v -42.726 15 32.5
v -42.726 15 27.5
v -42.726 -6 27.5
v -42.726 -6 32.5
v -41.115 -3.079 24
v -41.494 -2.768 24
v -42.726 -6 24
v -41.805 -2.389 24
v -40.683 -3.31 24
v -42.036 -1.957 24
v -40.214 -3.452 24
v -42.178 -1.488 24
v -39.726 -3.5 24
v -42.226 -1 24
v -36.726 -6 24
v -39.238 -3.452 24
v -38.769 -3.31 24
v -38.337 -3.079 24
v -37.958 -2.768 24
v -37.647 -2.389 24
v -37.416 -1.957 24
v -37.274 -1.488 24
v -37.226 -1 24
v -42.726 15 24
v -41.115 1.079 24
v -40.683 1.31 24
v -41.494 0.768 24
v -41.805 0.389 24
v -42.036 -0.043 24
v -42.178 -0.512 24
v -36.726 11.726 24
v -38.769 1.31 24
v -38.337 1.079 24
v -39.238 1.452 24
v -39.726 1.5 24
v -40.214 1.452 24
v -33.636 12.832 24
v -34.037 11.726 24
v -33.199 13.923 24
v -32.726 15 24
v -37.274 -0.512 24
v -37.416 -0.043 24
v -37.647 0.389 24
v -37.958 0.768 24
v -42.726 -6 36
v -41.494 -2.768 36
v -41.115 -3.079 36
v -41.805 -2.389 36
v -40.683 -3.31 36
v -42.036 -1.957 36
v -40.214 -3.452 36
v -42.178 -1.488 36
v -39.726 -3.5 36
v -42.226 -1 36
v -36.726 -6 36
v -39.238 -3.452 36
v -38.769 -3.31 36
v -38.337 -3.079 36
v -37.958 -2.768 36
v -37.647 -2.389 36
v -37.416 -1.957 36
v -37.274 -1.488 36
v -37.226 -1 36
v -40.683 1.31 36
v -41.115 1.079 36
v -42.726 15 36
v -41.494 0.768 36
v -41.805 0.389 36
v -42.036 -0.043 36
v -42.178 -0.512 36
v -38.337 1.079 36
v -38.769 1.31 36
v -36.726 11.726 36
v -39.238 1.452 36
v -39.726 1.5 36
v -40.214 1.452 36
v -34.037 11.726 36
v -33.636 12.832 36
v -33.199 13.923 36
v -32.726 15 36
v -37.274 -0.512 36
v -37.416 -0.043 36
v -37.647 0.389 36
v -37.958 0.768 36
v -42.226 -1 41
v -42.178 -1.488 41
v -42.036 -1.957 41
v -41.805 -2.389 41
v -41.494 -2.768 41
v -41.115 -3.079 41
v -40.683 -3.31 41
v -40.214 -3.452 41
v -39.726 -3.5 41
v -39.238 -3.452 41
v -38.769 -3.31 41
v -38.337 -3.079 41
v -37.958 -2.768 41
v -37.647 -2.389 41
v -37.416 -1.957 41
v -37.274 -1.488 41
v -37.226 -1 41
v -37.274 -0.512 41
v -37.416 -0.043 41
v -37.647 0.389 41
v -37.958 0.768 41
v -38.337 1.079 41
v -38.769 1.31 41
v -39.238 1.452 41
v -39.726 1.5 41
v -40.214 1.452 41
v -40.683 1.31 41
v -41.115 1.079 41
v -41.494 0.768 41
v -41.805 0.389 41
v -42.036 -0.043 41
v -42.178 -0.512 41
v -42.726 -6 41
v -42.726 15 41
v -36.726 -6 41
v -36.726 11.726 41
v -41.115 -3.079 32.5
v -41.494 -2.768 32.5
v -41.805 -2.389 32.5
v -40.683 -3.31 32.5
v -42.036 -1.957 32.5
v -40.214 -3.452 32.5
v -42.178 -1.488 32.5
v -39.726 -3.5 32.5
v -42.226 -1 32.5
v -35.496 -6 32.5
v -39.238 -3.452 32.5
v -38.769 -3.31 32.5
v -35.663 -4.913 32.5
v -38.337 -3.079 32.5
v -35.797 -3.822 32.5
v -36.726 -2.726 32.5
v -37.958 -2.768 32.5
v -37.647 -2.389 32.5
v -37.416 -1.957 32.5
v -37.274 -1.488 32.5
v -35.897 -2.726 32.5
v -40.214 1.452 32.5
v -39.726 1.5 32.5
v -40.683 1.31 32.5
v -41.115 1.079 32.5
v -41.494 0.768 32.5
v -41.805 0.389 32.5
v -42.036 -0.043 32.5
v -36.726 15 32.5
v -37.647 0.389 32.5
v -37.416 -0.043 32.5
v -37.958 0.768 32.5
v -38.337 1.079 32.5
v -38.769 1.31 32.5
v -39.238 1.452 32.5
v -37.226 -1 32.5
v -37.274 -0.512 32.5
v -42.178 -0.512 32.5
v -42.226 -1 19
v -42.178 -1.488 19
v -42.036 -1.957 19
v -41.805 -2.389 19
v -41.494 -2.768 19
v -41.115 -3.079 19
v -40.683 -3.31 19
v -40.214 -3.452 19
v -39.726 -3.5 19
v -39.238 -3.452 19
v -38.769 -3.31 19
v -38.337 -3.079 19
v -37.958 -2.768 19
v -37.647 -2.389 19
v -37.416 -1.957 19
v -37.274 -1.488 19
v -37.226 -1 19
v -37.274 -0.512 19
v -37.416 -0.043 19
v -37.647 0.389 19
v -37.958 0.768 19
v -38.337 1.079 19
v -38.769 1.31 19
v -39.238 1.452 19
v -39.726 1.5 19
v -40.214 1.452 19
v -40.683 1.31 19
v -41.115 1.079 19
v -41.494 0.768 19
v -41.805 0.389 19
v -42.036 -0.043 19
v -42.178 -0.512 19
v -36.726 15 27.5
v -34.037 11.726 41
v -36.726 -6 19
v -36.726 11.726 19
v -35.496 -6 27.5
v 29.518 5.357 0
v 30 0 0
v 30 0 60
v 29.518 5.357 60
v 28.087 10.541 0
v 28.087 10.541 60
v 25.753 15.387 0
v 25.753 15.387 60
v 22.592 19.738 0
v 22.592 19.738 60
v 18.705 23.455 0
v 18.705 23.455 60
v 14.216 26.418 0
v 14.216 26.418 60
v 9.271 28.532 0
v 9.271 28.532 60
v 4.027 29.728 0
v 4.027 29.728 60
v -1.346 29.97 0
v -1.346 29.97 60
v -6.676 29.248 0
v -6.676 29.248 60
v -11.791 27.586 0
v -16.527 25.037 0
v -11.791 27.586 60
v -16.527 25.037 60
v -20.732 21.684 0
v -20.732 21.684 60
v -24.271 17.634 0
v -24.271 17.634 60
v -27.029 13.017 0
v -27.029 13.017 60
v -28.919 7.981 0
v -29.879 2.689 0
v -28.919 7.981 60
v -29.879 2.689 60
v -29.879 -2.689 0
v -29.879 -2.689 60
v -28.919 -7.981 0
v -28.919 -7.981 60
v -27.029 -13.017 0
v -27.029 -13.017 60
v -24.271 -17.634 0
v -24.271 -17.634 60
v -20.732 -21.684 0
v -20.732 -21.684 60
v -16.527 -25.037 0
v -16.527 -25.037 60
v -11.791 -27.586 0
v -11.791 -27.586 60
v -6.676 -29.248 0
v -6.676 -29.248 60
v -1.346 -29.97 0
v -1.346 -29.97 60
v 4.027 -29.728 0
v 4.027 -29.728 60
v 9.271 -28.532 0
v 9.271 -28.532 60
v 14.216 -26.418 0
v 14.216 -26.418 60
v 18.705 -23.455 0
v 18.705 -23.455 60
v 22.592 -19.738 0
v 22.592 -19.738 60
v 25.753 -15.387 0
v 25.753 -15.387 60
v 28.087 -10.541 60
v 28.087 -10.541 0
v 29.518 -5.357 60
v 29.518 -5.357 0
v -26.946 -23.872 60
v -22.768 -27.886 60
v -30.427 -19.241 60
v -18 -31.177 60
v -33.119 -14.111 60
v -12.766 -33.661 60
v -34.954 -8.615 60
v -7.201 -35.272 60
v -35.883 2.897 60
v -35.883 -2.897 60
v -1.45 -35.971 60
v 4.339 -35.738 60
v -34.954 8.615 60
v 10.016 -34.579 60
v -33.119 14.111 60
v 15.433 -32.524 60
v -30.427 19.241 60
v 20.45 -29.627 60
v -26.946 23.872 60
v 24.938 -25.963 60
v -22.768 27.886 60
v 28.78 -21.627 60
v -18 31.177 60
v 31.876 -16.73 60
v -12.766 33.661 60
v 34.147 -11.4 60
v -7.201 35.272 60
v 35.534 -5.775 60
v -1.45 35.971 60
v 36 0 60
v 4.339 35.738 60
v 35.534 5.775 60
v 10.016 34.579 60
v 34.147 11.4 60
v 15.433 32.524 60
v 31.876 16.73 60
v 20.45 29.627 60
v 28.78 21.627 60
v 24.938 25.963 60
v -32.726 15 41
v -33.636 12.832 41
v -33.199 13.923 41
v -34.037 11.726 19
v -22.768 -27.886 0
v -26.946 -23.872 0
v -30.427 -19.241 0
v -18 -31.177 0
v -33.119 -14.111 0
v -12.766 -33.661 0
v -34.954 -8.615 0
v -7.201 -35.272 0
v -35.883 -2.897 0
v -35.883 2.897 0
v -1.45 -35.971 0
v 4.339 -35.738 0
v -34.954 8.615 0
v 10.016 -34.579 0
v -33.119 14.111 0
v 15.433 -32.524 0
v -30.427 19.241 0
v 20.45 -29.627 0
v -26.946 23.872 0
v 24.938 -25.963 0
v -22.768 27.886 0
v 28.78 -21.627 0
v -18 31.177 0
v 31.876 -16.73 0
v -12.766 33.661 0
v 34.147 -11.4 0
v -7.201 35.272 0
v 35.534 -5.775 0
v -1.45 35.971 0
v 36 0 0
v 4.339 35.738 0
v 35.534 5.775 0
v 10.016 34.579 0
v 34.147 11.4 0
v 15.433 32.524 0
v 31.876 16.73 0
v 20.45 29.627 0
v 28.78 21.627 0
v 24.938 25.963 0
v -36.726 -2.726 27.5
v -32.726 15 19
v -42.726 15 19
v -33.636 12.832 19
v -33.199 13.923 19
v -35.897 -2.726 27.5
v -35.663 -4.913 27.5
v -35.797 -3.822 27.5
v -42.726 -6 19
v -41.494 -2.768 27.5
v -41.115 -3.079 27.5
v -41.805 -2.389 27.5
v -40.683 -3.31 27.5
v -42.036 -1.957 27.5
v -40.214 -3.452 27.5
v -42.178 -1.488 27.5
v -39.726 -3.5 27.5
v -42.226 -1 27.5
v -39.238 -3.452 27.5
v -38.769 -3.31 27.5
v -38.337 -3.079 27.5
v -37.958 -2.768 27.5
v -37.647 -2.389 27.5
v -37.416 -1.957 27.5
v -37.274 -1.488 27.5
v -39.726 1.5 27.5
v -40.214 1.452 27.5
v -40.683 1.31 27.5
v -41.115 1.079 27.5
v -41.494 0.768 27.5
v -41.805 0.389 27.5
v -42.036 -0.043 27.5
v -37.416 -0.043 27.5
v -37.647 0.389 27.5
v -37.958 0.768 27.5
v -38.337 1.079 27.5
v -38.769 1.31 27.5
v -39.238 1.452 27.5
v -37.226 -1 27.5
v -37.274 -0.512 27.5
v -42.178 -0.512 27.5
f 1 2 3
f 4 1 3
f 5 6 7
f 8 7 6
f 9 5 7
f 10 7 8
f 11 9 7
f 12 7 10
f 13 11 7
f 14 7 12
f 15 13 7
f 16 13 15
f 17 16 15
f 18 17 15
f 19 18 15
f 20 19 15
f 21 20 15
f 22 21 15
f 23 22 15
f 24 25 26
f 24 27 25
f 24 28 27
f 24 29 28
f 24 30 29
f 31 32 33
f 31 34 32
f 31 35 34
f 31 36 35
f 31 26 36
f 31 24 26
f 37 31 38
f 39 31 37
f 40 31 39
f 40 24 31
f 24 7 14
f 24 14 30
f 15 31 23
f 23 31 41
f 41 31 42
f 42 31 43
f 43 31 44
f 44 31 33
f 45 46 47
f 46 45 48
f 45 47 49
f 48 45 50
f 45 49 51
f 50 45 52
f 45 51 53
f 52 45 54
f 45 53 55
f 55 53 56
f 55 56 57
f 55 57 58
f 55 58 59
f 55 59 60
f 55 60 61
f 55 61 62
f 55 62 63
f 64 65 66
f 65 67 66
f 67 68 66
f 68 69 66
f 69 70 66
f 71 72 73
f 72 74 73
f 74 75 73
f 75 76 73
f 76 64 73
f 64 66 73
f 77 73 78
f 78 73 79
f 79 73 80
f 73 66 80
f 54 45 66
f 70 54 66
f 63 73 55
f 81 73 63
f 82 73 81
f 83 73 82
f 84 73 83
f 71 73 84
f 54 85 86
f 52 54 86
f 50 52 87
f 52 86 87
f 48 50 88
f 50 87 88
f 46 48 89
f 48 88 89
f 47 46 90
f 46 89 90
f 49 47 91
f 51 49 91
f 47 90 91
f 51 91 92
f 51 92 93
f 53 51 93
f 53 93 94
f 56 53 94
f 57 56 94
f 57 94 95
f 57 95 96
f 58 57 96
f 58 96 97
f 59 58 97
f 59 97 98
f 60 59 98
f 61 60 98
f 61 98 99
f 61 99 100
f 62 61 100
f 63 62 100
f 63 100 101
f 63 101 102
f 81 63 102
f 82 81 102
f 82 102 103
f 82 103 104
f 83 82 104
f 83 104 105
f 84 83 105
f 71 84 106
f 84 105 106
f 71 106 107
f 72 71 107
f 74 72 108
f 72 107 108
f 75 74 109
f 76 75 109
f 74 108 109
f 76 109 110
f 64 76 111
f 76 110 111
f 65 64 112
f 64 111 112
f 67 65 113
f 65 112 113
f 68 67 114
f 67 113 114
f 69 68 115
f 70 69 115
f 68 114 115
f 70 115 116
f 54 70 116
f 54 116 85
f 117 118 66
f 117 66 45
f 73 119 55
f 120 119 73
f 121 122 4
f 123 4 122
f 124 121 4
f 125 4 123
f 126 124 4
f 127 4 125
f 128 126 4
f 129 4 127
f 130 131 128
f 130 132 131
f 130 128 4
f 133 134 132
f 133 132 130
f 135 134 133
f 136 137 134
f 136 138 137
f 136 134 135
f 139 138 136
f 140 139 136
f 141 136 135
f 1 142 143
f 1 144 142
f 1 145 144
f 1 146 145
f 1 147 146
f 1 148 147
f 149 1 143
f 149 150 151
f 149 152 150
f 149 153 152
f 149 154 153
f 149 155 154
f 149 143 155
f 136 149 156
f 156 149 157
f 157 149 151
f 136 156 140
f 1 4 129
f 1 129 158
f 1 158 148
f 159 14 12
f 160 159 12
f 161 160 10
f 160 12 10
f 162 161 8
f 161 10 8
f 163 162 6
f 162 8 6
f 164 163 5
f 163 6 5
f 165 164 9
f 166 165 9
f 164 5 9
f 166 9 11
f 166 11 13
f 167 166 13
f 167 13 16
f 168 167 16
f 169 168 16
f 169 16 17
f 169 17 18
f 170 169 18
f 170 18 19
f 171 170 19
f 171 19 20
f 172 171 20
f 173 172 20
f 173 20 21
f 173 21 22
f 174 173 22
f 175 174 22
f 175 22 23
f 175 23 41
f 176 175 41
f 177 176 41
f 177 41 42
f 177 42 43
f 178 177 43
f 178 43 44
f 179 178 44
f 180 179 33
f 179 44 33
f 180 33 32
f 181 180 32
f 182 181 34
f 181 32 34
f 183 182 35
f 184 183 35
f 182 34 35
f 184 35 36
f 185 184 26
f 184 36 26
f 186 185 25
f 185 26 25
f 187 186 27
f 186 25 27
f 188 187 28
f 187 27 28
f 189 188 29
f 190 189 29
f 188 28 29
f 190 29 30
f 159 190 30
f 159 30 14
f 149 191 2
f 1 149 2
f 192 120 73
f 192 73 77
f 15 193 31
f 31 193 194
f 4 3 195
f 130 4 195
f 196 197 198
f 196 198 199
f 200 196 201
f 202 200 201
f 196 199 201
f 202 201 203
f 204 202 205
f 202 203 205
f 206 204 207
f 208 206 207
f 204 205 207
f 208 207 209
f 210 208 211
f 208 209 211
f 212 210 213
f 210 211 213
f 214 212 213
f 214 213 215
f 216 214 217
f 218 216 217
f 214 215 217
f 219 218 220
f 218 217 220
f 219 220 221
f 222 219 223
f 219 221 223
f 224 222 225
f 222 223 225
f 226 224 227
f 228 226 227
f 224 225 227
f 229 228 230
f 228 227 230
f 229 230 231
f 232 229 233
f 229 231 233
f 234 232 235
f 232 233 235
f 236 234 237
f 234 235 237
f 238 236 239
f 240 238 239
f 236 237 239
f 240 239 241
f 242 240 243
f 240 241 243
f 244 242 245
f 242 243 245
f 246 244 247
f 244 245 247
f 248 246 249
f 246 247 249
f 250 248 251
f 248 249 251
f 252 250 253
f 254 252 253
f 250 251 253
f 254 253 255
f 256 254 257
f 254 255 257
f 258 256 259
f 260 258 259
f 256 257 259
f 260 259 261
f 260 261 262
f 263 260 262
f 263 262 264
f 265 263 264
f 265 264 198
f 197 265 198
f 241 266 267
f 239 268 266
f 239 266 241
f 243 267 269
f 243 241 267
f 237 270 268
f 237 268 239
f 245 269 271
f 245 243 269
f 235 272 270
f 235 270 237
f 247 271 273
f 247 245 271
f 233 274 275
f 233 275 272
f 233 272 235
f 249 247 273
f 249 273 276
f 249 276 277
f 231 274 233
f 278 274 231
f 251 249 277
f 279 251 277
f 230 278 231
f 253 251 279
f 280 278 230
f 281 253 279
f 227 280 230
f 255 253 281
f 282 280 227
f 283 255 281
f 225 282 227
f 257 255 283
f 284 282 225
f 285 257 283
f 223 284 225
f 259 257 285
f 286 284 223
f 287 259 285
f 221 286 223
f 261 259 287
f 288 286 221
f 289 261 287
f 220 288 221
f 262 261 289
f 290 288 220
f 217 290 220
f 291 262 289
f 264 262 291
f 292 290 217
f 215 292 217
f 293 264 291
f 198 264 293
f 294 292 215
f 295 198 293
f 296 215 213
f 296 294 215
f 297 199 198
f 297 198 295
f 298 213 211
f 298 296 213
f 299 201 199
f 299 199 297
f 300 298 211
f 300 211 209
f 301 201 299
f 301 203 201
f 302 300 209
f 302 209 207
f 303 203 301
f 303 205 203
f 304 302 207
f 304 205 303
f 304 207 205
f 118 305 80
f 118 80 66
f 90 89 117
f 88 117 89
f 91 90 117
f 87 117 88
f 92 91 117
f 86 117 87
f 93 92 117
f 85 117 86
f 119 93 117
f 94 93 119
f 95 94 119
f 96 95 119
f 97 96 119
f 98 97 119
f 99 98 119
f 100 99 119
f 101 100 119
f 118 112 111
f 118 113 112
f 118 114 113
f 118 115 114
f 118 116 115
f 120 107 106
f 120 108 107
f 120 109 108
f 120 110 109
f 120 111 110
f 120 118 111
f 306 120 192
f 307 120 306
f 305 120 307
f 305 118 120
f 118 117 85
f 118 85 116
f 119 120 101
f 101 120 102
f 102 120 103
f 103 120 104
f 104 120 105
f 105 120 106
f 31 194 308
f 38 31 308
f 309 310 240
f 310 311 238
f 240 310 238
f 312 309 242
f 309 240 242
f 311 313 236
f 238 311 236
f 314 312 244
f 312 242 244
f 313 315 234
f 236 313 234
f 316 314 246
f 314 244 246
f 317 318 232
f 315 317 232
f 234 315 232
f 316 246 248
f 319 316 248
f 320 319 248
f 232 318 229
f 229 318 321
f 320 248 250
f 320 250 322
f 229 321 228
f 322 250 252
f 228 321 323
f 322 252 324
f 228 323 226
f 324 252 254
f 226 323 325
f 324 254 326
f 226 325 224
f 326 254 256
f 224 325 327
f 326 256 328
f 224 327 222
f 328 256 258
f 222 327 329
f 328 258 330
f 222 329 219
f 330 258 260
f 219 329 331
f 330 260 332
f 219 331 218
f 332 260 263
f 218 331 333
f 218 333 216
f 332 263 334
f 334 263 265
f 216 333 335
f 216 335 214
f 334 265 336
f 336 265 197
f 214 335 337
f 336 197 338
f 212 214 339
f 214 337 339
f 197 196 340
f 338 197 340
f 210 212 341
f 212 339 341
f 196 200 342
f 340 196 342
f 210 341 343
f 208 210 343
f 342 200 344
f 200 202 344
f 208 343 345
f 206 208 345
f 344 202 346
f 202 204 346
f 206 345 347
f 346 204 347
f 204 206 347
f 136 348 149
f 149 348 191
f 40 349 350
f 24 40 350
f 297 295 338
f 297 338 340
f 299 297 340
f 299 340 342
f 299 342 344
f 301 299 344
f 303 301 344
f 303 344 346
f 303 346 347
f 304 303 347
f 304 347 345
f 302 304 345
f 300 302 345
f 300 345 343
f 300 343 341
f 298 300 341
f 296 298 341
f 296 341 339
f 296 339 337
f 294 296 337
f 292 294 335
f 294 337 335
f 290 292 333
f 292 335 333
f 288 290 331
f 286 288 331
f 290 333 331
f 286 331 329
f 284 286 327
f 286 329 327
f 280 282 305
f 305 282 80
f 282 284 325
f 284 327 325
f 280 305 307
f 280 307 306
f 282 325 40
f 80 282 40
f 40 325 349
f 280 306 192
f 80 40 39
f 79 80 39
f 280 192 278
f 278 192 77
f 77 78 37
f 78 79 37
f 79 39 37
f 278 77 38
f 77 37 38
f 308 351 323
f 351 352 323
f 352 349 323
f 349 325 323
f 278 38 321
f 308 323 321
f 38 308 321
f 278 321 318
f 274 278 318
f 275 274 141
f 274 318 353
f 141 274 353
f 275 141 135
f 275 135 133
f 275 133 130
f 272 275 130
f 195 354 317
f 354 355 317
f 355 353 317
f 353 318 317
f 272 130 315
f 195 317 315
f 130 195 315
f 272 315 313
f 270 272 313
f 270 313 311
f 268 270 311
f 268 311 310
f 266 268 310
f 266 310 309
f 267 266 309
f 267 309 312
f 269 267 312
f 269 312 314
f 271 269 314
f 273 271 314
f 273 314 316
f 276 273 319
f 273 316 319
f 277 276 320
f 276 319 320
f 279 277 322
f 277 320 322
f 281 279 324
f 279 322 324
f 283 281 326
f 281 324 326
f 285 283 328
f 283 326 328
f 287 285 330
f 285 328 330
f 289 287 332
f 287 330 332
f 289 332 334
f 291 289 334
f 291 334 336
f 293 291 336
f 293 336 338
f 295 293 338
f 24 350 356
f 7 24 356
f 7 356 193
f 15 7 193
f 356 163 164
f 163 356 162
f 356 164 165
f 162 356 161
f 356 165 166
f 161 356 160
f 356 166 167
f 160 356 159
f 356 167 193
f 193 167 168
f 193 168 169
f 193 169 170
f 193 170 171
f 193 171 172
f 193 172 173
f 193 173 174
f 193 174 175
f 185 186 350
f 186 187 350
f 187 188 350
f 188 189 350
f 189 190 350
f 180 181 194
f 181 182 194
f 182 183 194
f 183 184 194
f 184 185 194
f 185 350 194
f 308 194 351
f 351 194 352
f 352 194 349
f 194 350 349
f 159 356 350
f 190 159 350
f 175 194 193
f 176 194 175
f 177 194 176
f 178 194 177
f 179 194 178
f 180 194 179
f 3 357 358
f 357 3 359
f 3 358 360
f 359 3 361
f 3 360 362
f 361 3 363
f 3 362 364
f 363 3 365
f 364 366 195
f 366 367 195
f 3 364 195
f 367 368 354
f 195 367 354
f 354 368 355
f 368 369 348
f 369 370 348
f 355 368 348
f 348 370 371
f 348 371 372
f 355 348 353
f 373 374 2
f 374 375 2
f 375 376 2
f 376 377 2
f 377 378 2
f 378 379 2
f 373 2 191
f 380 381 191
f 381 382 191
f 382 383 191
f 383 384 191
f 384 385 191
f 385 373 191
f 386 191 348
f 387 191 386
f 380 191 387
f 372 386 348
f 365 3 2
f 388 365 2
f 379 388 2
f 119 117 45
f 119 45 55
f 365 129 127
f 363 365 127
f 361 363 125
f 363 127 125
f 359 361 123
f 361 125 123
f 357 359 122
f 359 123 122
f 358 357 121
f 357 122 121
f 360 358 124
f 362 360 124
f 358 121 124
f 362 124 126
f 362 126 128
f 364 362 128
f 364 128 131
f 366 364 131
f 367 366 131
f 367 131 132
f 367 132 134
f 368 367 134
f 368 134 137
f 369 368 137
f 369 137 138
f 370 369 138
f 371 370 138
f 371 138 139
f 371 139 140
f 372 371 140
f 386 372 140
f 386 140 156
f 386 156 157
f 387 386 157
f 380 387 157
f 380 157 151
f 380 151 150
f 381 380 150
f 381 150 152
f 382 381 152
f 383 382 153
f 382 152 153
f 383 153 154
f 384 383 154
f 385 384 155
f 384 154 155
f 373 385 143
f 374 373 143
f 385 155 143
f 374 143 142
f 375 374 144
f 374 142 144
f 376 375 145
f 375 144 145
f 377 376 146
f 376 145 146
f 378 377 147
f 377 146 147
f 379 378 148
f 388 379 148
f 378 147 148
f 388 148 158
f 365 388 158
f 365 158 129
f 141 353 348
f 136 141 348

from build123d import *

# Parameters (mm, degrees)
SKETCH1_R                = 36
BOSS_EXTRUDE1_DEPTH      = 60
SKETCH2_R                = 30
CUT_EXTRUDE1_DEPTH       = 60
BOSS_EXTRUDE2_START      = -5
BOSS_EXTRUDE2_DEPTH      = 5
BOSS_EXTRUDE4_DEPTH      = 2.5
BOSS_EXTRUDE4_DEPTH_BACK = 2.5
SKETCH7_R                = 2.5
CUT_EXTRUDE2_DEPTH       = 70.300236124


with BuildPart() as part:
    # Sketch1 → Boss-Extrude1 (new body)
    with BuildSketch(Plane.XY):
        Circle(SKETCH1_R)
    extrude(amount=BOSS_EXTRUDE1_DEPTH)

    # Sketch2 → Cut-Extrude1 (cut)
    with BuildSketch(Plane.XY.offset(60)):
        Circle(SKETCH2_R)
    extrude(amount=-CUT_EXTRUDE1_DEPTH, mode=Mode.SUBTRACT)

    # Sketch5 → Boss-Extrude2 (add)
    with BuildSketch(Plane.XY.offset(24).offset(BOSS_EXTRUDE2_START)):
        with BuildLine():
            Line((-32.726136344, 15), (-42.726136344, 15))
            Line((-42.726136344, 15), (-42.726136344, 0))
            Line((-42.726136344, 0), (-42.726136344, -6))
            Line((-42.726136344, -6), (-36.726136344, -6))
            Line((-36.726136344, -6), (-36.726136344, 11.726443556))
            Line((-36.726136344, 11.726443556), (-34.036605611, 11.726443556))
            ThreePointArc((-34.036605611, 11.726443556), (-33.421474703, 13.379276091), (-32.726136344, 15))
        make_face()
    boss_extrude2 = extrude(amount=BOSS_EXTRUDE2_DEPTH)

    # Mirror1: Boss-Extrude2 across plane
    add(boss_extrude2.mirror(Plane.XY.offset(30)))

    # Sketch6 → Boss-Extrude4 (add, two sides: drawn at the far end of the back side and taken through both)
    with BuildSketch(Plane.XY.offset(30).offset(-BOSS_EXTRUDE4_DEPTH_BACK)):
        with BuildLine():
            Line((-36.726136344, 15), (-42.726136344, 15))
            Line((-42.726136344, 15), (-42.726136344, -6))
            Line((-42.726136344, -6), (-32.726136344, -6))
            ThreePointArc((-32.726136344, -6), (-33.421474703, -4.379276091), (-34.036605611, -2.726443556))
            Line((-34.036605611, -2.726443556), (-36.726136344, -2.726443556))
            Line((-36.726136344, -2.726443556), (-36.726136344, 15))
        make_face()
    extrude(amount=BOSS_EXTRUDE4_DEPTH + BOSS_EXTRUDE4_DEPTH_BACK)

    # Sketch7 → Cut-Extrude2 (cut, through all)
    with BuildSketch(Plane.XY.offset(41)):
        with Locations(Location((-39.726136344, -1, 0), (0, 0, 180))):
            Circle(SKETCH7_R)
    extrude(amount=-CUT_EXTRUDE2_DEPTH, mode=Mode.SUBTRACT)


solid = part.part
